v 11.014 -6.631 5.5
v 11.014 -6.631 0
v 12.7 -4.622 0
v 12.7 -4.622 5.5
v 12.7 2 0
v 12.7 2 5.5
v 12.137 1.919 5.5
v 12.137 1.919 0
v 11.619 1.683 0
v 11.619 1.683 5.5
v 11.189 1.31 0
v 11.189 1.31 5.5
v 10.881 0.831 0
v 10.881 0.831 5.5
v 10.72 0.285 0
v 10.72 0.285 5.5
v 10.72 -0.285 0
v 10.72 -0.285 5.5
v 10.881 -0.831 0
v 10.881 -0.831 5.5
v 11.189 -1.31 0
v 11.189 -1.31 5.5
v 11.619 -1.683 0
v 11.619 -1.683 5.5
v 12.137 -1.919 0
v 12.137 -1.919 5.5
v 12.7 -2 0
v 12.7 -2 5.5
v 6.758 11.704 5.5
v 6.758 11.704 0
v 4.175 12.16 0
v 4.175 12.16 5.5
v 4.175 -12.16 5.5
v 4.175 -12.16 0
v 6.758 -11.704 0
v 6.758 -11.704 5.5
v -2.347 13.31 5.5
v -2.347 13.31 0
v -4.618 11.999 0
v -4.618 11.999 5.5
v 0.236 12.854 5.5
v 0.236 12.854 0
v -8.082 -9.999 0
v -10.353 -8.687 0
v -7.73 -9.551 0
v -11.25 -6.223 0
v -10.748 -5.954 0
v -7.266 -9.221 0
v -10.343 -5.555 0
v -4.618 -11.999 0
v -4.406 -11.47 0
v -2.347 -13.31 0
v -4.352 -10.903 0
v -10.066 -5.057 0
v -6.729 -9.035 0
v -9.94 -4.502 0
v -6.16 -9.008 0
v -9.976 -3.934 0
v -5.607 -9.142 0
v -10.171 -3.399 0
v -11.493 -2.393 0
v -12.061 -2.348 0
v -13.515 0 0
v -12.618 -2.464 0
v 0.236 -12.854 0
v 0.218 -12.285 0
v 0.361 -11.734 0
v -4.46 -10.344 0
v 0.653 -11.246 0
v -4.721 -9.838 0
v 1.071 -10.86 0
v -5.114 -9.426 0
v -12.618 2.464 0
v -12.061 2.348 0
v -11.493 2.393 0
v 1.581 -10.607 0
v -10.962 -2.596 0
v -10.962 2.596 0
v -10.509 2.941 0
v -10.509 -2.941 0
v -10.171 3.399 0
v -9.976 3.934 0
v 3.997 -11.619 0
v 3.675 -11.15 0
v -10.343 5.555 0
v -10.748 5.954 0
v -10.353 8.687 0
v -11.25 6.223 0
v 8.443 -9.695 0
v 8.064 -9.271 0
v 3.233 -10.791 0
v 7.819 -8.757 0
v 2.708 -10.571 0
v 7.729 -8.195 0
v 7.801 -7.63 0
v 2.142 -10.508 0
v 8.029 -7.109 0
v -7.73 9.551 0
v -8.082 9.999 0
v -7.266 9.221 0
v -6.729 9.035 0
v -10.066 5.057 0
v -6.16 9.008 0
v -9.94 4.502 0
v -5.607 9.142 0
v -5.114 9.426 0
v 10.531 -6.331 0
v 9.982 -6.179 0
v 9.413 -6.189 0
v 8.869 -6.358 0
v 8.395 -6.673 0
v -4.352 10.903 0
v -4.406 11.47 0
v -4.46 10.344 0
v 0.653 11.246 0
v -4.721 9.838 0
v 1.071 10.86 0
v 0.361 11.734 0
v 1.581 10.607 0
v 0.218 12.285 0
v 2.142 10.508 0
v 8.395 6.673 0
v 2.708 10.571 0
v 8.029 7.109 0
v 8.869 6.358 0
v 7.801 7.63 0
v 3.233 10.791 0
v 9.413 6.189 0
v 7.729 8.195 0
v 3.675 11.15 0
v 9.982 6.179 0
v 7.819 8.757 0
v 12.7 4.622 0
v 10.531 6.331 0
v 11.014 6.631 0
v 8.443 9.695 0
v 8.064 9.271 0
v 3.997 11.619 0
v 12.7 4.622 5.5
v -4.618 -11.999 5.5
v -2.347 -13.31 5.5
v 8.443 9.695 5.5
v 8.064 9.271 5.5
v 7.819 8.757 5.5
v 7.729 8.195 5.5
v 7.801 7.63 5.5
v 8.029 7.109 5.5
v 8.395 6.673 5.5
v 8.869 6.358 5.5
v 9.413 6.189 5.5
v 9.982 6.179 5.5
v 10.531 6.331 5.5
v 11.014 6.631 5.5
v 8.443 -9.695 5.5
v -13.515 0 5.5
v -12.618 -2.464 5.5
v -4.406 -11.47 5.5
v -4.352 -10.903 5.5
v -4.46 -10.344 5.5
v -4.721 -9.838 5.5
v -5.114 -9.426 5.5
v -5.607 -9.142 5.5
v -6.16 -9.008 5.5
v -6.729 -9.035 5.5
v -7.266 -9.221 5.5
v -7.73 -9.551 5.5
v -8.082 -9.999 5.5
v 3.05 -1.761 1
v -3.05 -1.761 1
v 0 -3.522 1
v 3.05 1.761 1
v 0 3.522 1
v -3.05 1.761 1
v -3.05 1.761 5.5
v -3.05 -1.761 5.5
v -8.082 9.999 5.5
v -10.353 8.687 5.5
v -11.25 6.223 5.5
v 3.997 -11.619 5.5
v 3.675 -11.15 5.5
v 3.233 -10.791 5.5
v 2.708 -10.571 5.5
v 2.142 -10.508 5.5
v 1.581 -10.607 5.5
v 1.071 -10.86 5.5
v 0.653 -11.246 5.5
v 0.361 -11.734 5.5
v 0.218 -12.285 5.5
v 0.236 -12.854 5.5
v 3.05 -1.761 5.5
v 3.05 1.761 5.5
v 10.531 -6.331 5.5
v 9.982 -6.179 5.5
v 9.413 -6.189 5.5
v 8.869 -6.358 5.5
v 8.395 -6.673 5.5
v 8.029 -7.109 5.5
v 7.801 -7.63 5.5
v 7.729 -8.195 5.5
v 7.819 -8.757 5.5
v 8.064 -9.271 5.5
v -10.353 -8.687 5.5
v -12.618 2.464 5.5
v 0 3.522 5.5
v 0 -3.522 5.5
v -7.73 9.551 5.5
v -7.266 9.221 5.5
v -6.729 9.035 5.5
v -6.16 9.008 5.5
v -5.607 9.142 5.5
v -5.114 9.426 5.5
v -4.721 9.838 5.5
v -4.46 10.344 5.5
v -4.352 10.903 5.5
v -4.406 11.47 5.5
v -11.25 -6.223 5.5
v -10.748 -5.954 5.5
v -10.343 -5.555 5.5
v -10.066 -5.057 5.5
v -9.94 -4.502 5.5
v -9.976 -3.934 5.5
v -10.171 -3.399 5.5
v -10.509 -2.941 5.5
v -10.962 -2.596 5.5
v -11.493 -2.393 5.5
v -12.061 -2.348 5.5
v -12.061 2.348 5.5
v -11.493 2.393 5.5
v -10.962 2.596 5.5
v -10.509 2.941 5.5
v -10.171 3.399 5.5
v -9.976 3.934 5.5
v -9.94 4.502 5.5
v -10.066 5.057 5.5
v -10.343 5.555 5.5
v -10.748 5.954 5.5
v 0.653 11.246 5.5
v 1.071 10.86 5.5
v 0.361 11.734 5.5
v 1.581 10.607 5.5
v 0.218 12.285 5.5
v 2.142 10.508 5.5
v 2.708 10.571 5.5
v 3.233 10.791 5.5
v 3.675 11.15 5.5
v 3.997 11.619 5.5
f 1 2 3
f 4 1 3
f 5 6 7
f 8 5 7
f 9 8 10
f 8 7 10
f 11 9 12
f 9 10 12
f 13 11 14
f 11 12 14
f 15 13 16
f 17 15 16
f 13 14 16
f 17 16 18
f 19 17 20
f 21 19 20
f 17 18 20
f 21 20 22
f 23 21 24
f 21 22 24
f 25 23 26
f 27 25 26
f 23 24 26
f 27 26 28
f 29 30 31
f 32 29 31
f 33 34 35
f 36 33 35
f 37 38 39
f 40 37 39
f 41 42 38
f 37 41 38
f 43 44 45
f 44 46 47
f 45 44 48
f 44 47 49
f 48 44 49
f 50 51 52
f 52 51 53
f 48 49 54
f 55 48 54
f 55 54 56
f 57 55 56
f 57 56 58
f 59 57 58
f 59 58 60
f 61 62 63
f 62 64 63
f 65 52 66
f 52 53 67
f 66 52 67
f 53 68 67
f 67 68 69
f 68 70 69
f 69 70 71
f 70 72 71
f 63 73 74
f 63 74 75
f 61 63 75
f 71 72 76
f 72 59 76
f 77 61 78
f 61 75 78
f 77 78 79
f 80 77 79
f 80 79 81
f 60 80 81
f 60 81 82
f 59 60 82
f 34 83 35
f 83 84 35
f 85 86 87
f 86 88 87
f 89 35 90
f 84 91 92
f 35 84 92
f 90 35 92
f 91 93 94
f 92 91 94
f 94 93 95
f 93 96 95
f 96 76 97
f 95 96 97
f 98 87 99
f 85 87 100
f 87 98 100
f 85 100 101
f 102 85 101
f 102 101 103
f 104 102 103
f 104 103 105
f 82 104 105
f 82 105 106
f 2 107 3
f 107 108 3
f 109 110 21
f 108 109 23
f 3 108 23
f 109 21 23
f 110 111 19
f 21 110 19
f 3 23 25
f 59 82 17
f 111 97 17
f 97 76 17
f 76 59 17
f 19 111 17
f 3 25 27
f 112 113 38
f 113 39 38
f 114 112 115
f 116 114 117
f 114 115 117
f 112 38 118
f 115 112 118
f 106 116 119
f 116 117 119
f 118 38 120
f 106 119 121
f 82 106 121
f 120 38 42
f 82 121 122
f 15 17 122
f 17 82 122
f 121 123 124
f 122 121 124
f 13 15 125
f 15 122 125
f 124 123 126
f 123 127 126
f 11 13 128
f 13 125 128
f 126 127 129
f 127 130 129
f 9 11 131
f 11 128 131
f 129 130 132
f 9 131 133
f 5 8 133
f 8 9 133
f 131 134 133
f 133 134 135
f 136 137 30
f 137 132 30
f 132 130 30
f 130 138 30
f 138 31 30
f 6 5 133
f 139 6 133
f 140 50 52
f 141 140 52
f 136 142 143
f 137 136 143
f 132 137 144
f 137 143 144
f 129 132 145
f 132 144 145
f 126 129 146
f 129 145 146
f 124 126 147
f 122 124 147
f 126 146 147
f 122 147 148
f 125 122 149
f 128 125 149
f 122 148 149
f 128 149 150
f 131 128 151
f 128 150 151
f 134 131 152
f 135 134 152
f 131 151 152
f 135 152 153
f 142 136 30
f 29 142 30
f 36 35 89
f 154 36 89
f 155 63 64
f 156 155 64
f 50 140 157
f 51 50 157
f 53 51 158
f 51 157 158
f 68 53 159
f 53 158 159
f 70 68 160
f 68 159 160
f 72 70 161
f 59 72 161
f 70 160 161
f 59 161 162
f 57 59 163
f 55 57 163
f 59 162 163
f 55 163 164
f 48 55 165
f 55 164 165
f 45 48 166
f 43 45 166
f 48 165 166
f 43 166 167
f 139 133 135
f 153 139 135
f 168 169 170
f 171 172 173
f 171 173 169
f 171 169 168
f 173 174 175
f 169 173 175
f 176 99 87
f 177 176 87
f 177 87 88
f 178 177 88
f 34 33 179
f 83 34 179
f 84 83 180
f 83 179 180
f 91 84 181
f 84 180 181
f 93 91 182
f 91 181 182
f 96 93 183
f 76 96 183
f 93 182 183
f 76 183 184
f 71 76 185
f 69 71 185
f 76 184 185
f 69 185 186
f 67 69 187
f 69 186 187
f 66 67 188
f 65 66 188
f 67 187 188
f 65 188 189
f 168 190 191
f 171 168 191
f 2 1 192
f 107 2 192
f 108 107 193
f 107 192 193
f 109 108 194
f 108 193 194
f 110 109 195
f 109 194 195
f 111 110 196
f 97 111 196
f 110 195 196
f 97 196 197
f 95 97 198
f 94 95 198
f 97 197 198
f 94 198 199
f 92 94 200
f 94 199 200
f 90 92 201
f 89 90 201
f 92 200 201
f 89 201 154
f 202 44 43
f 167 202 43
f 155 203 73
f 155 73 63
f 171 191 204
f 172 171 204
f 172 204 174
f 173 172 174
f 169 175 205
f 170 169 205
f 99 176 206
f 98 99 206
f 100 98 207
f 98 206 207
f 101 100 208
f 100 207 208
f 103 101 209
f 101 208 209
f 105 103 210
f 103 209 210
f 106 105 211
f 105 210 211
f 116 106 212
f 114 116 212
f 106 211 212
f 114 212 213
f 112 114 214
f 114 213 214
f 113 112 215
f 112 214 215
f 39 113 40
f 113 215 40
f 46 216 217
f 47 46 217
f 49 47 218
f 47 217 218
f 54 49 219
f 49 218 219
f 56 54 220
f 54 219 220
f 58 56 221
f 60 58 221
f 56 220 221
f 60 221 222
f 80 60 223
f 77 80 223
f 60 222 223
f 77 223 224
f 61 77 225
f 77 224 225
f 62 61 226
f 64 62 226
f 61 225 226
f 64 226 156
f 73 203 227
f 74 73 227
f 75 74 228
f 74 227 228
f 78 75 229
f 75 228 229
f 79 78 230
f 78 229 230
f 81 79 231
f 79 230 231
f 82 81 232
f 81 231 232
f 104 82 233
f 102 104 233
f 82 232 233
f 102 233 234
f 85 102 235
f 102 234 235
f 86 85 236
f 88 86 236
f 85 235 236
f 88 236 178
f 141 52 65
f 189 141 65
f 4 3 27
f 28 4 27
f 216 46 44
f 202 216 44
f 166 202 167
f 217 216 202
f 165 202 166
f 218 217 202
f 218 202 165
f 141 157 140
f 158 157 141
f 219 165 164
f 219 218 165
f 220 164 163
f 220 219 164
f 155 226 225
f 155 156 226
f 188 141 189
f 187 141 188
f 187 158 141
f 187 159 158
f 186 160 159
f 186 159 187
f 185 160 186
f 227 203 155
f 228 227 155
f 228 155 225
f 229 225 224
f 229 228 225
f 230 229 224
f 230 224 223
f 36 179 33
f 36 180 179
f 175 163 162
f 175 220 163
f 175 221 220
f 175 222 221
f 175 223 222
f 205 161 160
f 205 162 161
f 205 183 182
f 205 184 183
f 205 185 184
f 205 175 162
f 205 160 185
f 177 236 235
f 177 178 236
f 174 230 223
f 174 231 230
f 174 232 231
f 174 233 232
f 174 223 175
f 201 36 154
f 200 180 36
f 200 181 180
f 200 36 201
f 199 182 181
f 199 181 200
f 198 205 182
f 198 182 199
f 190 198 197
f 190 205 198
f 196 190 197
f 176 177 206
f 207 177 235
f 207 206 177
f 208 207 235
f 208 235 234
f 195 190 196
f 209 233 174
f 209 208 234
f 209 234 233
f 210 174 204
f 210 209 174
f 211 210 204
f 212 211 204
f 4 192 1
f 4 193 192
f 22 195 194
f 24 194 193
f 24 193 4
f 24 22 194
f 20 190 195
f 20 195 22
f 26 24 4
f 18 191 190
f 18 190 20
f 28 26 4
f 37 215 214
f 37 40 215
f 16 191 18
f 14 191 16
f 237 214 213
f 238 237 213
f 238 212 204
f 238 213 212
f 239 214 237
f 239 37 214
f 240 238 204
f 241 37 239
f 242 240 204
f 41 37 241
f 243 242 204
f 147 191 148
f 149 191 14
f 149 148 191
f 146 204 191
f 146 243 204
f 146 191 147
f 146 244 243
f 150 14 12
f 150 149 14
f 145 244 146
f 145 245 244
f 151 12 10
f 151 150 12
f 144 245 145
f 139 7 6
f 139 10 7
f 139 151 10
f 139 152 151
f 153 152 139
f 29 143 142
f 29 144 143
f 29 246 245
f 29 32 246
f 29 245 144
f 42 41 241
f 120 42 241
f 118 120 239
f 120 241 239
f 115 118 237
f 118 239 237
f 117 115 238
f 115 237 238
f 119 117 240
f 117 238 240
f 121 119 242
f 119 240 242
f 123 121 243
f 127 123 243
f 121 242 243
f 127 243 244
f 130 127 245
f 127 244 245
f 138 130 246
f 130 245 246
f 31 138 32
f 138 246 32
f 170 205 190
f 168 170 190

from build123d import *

# Parameters (mm, degrees)
F1_DEPTH        = 5.5
F3_DEPTH        = 4.5
F5_DEPTH        = 25.4
F5_COPIES_COUNT = 9


# Not quite as in the source:
# - a pattern or mirror of a feature is missing from the dataset's text; its kind, count and spacing are read off the source's solid


with BuildPart() as f1:
    # F0 (on Top) → F1 (new body)
    with BuildSketch(Plane.XY):
        Polygon((12.7, -4.6224219752), (12.7, 4.6224219752), (6.7575288552, 11.7043833109), (-2.3468651425, 13.3097336157), (-10.3531348575, 8.6873116405), (-13.5150577104, 0), (-10.3531348575, -8.6873116405), (-2.3468651425, -13.3097336157), (6.7575288552, -11.7043833109), align=None)
    extrude(amount=F1_DEPTH)

    # F2 (on face) → F3 (cut)
    with BuildSketch(Plane.XY.offset(5.5)):
        Polygon((3.05, -1.760918321), (3.05, 1.760918321), (0, 3.5218366421), (-3.05, 1.760918321), (-3.05, -1.760918321), (0, -3.5218366421), align=None)
    extrude(amount=-F3_DEPTH, mode=Mode.SUBTRACT)

    # F4 (on face) → F5 (cut)
    with BuildSketch(Plane.XY.offset(5.5)):
        with BuildLine():
            Line((8.4431892082, -9.6954915293), (11.014339647, -6.6313137568))
            ThreePointArc((11.014339647, -6.6313137568), (8.1966755414, -6.8778274236), (8.4431892082, -9.6954915293))
        make_face()
    f5 = extrude(amount=-F5_DEPTH, mode=Mode.SUBTRACT)

    # F5_copies: F5 ×9 about axis
    f5_copies_axis = Axis((0, 0, 0), (0, 0, 1))
    for i in range(1, F5_COPIES_COUNT):
        add(f5.rotate(f5_copies_axis, i * 360 / F5_COPIES_COUNT), mode=Mode.SUBTRACT)


solid = f1.part
